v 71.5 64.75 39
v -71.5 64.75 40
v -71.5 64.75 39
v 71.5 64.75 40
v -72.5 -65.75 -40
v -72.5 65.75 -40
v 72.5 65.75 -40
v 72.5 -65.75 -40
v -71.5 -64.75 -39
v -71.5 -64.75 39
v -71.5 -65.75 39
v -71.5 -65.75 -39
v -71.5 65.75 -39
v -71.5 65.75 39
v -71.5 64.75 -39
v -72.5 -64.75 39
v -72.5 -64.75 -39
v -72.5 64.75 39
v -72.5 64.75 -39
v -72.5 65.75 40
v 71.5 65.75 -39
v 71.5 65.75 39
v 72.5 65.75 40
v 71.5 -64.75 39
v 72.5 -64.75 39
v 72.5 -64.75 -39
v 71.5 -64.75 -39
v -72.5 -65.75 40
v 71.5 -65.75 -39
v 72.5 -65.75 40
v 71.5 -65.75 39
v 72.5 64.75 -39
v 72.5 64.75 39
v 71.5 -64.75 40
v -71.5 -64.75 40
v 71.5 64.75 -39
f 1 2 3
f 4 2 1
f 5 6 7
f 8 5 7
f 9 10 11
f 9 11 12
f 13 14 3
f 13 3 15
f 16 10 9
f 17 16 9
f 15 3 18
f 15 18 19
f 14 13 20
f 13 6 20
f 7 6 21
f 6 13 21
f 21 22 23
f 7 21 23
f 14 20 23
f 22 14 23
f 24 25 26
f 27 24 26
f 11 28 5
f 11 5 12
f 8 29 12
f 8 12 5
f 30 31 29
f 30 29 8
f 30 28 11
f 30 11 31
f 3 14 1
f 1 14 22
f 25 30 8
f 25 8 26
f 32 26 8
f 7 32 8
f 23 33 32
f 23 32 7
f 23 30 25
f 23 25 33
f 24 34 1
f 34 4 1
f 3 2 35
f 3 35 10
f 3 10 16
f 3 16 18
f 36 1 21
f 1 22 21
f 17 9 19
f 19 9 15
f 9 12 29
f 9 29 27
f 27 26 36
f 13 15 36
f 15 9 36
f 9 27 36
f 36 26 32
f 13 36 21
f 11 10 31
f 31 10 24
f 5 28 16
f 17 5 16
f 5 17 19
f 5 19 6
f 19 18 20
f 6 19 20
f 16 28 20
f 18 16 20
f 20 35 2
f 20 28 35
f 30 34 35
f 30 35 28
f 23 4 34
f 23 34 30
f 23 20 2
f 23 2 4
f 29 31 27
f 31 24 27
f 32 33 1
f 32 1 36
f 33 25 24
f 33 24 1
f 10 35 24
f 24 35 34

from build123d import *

# Parameters (mm, degrees)
CROQUIS1_W              = 145
CROQUIS1_H              = 131.5
SALIENTE_EXTRUIR1_DEPTH = 40
VACIADO1_T              = -1
CROQUIS2_W              = 143
CROQUIS2_H              = 78
CORTAR_EXTRUIR1_DEPTH   = 160
CROQUIS3_W              = 78
CROQUIS3_H              = 129.5
CORTAR_EXTRUIR2_DEPTH   = 180


with BuildPart() as part:
    # Croquis1 → Saliente-Extruir1 (new, symmetric)
    with BuildSketch(Plane.XY):
        Rectangle(CROQUIS1_W, CROQUIS1_H)
    extrude(amount=SALIENTE_EXTRUIR1_DEPTH, both=True)

    # Vaciado1
    vaciado1_openings = [part.faces().sort_by_distance(p)[0] for p in [
        (0, 0, 40),
    ]]
    offset(amount=VACIADO1_T, openings=vaciado1_openings, kind=Kind.INTERSECTION)

    # Croquis2 → Cortar-Extruir1 (cut)
    with BuildSketch(Plane(origin=(0, 65.75, 0), x_dir=(1, 0, 0), z_dir=(0, 1, 0))):
        Rectangle(CROQUIS2_W, CROQUIS2_H)
    extrude(amount=-CORTAR_EXTRUIR1_DEPTH, mode=Mode.SUBTRACT)

    # Croquis3 → Cortar-Extruir2 (cut)
    with BuildSketch(Plane(origin=(72.5, 0, 0), x_dir=(0, 0, -1), z_dir=(1, 0, 0))):
        Rectangle(CROQUIS3_W, CROQUIS3_H)
    extrude(amount=-CORTAR_EXTRUIR2_DEPTH, mode=Mode.SUBTRACT)


solid = part.part
